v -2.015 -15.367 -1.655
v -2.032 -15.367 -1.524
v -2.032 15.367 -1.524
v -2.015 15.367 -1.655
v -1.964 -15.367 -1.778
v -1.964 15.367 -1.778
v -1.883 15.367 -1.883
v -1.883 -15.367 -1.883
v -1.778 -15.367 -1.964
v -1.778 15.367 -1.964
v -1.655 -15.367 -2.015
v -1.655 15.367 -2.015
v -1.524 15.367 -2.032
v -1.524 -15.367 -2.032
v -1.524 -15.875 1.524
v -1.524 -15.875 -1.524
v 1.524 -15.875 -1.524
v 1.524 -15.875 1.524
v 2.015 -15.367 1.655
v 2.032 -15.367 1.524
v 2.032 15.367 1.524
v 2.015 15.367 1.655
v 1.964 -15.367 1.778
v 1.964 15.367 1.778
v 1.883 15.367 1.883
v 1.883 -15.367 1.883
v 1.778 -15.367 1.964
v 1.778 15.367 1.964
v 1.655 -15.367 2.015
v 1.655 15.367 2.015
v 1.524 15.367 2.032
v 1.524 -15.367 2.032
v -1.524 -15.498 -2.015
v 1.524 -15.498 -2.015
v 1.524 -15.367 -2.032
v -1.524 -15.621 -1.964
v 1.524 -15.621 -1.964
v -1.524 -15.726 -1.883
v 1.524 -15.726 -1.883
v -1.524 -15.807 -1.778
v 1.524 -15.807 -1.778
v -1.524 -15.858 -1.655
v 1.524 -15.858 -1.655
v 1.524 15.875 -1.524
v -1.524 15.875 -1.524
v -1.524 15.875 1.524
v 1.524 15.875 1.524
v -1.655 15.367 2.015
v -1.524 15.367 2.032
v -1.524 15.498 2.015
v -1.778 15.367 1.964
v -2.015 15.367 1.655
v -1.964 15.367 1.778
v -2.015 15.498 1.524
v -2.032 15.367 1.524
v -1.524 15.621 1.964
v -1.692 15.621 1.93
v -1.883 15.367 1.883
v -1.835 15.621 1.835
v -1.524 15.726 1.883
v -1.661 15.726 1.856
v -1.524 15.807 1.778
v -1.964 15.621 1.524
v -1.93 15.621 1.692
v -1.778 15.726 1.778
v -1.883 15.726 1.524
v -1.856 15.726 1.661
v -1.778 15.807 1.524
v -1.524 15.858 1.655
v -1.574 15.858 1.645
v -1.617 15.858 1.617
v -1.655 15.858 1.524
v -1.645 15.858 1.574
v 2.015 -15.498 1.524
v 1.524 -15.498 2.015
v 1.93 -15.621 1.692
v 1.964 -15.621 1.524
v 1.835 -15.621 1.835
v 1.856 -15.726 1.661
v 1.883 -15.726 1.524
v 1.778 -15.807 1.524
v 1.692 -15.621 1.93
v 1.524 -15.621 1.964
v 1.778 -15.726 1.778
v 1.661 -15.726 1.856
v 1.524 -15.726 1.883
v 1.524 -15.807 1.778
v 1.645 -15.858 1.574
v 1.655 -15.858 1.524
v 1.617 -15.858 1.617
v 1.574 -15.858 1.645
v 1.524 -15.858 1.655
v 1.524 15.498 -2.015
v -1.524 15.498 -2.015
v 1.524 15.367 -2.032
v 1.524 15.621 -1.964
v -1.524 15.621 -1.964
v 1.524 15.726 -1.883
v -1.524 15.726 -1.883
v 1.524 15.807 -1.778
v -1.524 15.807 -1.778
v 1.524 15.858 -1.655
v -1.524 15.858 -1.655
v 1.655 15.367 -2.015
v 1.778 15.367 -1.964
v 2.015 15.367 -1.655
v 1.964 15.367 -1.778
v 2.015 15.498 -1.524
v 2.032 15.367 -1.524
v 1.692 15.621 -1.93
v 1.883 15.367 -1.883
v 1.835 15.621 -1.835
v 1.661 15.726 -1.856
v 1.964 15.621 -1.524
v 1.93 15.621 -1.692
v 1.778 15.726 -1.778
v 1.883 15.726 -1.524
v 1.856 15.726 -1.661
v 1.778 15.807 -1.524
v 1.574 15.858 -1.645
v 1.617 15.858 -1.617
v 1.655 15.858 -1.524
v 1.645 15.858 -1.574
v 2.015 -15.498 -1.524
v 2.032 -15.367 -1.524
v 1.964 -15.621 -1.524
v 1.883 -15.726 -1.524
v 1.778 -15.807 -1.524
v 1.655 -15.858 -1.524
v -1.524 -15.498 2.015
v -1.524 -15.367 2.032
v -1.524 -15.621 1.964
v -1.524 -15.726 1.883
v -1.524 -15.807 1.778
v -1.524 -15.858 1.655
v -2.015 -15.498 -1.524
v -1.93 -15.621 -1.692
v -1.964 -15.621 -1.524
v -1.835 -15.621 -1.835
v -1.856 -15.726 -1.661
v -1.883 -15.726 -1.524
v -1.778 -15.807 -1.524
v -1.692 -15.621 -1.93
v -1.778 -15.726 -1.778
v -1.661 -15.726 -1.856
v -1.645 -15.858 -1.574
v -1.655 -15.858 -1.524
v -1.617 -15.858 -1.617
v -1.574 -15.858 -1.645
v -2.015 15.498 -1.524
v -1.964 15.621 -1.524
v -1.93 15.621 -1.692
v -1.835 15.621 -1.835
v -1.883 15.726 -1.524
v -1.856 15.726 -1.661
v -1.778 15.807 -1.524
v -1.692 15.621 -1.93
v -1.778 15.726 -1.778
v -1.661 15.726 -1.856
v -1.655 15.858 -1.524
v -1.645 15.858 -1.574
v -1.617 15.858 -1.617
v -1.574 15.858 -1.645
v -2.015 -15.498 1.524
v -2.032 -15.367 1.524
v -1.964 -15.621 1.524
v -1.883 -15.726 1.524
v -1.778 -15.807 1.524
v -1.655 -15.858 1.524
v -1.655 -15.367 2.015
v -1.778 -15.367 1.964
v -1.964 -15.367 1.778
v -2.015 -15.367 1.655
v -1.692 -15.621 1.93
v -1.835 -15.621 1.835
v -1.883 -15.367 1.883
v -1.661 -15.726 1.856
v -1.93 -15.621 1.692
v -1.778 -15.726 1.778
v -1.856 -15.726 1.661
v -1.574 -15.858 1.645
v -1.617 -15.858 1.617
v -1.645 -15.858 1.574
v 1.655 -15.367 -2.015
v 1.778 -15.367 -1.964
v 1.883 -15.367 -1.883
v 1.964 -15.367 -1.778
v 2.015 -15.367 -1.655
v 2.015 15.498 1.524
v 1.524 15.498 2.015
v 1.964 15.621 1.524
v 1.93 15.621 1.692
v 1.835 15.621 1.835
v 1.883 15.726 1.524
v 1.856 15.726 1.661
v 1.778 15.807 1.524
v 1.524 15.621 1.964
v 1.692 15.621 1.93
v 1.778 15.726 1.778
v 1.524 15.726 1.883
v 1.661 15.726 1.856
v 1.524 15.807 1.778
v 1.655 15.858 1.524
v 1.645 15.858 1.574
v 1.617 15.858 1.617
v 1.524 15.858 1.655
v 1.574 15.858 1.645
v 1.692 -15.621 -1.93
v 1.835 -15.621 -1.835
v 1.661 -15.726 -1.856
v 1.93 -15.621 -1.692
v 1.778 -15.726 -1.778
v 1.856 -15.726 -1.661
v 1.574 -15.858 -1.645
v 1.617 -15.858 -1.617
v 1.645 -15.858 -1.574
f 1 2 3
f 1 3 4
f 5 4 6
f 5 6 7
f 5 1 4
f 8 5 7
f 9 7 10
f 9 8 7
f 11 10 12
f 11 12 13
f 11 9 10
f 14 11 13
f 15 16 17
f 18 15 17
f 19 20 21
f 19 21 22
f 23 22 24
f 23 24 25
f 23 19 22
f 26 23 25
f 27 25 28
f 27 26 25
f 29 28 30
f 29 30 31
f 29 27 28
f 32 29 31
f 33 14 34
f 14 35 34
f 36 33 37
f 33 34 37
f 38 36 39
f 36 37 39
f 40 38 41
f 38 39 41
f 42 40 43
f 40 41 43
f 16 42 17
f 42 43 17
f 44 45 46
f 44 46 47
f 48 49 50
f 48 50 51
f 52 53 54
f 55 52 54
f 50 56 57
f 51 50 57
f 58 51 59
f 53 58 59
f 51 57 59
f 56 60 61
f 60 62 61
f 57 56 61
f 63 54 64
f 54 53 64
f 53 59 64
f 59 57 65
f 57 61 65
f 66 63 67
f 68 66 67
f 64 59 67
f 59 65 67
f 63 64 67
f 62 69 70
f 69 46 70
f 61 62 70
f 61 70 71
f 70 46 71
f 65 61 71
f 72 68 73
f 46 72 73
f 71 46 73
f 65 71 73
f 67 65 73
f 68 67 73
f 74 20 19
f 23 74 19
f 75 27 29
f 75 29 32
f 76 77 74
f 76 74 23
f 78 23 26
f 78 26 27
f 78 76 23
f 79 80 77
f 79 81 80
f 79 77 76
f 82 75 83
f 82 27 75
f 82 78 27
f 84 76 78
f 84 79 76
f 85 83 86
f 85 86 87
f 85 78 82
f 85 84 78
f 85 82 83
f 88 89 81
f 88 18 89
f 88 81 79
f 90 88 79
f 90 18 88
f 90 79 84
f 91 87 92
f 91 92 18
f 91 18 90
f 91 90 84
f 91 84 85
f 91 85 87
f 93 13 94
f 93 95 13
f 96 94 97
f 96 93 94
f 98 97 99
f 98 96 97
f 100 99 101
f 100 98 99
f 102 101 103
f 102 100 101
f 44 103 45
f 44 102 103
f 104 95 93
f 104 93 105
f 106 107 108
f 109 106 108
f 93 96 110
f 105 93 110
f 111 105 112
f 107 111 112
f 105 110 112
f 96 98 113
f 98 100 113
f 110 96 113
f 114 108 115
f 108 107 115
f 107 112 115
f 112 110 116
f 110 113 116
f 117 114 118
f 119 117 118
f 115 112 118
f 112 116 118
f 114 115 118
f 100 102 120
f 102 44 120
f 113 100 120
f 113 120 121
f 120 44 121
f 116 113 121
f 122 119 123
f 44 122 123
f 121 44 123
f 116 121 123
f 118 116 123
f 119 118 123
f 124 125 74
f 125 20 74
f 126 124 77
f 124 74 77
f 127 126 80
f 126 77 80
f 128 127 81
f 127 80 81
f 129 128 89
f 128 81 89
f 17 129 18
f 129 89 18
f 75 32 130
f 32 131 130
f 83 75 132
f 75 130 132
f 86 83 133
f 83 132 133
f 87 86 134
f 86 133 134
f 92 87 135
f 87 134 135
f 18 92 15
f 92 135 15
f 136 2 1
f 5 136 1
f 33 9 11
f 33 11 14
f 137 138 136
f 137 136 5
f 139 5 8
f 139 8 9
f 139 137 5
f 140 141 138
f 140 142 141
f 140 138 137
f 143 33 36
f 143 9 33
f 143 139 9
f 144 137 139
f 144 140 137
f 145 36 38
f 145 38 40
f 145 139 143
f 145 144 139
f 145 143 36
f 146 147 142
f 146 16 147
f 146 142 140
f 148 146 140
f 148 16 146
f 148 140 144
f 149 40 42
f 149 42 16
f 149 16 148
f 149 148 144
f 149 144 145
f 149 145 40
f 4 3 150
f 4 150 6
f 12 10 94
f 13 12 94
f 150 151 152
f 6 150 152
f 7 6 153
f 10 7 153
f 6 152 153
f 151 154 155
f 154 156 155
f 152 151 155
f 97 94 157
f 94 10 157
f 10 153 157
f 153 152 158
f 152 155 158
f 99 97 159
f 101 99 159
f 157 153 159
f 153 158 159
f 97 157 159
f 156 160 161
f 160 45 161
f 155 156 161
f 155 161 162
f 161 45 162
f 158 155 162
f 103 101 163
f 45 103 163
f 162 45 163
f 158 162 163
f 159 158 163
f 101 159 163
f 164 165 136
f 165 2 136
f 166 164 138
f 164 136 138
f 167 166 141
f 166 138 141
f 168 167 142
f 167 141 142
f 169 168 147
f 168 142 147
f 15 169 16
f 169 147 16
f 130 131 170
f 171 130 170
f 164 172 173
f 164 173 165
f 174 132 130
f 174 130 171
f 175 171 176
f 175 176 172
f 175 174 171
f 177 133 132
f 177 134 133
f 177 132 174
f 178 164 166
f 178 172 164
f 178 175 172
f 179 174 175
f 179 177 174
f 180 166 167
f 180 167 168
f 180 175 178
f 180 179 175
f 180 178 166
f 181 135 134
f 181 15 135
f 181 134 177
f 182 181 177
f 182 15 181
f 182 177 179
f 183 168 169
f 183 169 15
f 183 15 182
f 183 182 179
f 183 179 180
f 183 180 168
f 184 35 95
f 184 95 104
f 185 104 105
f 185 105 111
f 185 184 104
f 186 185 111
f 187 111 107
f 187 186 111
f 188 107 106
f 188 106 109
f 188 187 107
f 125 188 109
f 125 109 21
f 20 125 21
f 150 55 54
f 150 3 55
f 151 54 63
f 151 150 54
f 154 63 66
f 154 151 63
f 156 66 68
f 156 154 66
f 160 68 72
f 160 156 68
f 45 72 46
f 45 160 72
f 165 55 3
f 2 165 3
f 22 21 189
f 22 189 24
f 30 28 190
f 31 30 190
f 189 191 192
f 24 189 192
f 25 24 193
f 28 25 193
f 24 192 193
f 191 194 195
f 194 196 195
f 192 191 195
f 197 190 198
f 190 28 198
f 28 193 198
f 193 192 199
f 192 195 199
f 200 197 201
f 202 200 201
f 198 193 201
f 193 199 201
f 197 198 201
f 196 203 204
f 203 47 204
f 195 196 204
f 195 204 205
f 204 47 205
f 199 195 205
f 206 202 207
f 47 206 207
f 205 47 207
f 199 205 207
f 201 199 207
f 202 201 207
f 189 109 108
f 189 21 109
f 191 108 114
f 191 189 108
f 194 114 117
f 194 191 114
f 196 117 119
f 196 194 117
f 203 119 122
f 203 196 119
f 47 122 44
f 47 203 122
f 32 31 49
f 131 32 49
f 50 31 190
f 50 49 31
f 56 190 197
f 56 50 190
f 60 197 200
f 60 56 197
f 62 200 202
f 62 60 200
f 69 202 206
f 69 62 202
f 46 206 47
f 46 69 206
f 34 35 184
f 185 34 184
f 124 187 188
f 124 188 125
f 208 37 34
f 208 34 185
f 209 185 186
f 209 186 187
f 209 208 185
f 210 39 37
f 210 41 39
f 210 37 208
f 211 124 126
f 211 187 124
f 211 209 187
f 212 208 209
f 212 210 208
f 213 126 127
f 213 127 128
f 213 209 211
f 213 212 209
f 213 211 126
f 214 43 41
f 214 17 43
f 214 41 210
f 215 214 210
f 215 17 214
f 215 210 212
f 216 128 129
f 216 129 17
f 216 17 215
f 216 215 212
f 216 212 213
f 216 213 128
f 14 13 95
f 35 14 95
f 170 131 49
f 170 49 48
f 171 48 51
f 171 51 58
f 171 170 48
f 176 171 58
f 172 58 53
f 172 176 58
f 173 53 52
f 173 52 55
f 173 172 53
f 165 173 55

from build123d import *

# Parameters (mm, degrees)
F1_DEPTH = 15.875
F2_R     = 0.508


with BuildPart() as f1:
    # F0 (on Front) → F1 (new body, symmetric)
    with BuildSketch(Plane.XZ):
        with BuildLine():
            ThreePointArc((2.032, 1.524), (1.88321, 1.88321), (1.524, 2.032))
            Line((1.524, 2.032), (-1.524, 2.032))
            ThreePointArc((-1.524, 2.032), (-1.88321, 1.88321), (-2.032, 1.524))
            Line((-2.032, 1.524), (-2.032, -1.524))
            ThreePointArc((-2.032, -1.524), (-1.88321, -1.88321), (-1.524, -2.032))
            Line((-1.524, -2.032), (1.524, -2.032))
            ThreePointArc((1.524, -2.032), (1.88321, -1.88321), (2.032, -1.524))
            Line((2.032, -1.524), (2.032, 1.524))
        make_face()
    extrude(amount=F1_DEPTH, both=True)

    # F2
    f2_edges = [f1.edges().sort_by_distance(p)[0] for p in [
        (1.88321, -15.875, 1.88321),
        (0, -15.875, 2.032),
        (-1.88321, -15.875, 1.88321),
        (-2.032, -15.875, 0),
        (-1.88321, -15.875, -1.88321),
        (0, -15.875, -2.032),
        (1.88321, -15.875, -1.88321),
        (2.032, -15.875, 0),
        (1.88321, 15.875, 1.88321),
        (0, 15.875, 2.032),
        (-1.88321, 15.875, 1.88321),
        (-2.032, 15.875, 0),
        (-1.88321, 15.875, -1.88321),
        (0, 15.875, -2.032),
        (1.88321, 15.875, -1.88321),
        (2.032, 15.875, 0),
    ]]
    fillet(f2_edges, radius=F2_R)


solid = f1.part
